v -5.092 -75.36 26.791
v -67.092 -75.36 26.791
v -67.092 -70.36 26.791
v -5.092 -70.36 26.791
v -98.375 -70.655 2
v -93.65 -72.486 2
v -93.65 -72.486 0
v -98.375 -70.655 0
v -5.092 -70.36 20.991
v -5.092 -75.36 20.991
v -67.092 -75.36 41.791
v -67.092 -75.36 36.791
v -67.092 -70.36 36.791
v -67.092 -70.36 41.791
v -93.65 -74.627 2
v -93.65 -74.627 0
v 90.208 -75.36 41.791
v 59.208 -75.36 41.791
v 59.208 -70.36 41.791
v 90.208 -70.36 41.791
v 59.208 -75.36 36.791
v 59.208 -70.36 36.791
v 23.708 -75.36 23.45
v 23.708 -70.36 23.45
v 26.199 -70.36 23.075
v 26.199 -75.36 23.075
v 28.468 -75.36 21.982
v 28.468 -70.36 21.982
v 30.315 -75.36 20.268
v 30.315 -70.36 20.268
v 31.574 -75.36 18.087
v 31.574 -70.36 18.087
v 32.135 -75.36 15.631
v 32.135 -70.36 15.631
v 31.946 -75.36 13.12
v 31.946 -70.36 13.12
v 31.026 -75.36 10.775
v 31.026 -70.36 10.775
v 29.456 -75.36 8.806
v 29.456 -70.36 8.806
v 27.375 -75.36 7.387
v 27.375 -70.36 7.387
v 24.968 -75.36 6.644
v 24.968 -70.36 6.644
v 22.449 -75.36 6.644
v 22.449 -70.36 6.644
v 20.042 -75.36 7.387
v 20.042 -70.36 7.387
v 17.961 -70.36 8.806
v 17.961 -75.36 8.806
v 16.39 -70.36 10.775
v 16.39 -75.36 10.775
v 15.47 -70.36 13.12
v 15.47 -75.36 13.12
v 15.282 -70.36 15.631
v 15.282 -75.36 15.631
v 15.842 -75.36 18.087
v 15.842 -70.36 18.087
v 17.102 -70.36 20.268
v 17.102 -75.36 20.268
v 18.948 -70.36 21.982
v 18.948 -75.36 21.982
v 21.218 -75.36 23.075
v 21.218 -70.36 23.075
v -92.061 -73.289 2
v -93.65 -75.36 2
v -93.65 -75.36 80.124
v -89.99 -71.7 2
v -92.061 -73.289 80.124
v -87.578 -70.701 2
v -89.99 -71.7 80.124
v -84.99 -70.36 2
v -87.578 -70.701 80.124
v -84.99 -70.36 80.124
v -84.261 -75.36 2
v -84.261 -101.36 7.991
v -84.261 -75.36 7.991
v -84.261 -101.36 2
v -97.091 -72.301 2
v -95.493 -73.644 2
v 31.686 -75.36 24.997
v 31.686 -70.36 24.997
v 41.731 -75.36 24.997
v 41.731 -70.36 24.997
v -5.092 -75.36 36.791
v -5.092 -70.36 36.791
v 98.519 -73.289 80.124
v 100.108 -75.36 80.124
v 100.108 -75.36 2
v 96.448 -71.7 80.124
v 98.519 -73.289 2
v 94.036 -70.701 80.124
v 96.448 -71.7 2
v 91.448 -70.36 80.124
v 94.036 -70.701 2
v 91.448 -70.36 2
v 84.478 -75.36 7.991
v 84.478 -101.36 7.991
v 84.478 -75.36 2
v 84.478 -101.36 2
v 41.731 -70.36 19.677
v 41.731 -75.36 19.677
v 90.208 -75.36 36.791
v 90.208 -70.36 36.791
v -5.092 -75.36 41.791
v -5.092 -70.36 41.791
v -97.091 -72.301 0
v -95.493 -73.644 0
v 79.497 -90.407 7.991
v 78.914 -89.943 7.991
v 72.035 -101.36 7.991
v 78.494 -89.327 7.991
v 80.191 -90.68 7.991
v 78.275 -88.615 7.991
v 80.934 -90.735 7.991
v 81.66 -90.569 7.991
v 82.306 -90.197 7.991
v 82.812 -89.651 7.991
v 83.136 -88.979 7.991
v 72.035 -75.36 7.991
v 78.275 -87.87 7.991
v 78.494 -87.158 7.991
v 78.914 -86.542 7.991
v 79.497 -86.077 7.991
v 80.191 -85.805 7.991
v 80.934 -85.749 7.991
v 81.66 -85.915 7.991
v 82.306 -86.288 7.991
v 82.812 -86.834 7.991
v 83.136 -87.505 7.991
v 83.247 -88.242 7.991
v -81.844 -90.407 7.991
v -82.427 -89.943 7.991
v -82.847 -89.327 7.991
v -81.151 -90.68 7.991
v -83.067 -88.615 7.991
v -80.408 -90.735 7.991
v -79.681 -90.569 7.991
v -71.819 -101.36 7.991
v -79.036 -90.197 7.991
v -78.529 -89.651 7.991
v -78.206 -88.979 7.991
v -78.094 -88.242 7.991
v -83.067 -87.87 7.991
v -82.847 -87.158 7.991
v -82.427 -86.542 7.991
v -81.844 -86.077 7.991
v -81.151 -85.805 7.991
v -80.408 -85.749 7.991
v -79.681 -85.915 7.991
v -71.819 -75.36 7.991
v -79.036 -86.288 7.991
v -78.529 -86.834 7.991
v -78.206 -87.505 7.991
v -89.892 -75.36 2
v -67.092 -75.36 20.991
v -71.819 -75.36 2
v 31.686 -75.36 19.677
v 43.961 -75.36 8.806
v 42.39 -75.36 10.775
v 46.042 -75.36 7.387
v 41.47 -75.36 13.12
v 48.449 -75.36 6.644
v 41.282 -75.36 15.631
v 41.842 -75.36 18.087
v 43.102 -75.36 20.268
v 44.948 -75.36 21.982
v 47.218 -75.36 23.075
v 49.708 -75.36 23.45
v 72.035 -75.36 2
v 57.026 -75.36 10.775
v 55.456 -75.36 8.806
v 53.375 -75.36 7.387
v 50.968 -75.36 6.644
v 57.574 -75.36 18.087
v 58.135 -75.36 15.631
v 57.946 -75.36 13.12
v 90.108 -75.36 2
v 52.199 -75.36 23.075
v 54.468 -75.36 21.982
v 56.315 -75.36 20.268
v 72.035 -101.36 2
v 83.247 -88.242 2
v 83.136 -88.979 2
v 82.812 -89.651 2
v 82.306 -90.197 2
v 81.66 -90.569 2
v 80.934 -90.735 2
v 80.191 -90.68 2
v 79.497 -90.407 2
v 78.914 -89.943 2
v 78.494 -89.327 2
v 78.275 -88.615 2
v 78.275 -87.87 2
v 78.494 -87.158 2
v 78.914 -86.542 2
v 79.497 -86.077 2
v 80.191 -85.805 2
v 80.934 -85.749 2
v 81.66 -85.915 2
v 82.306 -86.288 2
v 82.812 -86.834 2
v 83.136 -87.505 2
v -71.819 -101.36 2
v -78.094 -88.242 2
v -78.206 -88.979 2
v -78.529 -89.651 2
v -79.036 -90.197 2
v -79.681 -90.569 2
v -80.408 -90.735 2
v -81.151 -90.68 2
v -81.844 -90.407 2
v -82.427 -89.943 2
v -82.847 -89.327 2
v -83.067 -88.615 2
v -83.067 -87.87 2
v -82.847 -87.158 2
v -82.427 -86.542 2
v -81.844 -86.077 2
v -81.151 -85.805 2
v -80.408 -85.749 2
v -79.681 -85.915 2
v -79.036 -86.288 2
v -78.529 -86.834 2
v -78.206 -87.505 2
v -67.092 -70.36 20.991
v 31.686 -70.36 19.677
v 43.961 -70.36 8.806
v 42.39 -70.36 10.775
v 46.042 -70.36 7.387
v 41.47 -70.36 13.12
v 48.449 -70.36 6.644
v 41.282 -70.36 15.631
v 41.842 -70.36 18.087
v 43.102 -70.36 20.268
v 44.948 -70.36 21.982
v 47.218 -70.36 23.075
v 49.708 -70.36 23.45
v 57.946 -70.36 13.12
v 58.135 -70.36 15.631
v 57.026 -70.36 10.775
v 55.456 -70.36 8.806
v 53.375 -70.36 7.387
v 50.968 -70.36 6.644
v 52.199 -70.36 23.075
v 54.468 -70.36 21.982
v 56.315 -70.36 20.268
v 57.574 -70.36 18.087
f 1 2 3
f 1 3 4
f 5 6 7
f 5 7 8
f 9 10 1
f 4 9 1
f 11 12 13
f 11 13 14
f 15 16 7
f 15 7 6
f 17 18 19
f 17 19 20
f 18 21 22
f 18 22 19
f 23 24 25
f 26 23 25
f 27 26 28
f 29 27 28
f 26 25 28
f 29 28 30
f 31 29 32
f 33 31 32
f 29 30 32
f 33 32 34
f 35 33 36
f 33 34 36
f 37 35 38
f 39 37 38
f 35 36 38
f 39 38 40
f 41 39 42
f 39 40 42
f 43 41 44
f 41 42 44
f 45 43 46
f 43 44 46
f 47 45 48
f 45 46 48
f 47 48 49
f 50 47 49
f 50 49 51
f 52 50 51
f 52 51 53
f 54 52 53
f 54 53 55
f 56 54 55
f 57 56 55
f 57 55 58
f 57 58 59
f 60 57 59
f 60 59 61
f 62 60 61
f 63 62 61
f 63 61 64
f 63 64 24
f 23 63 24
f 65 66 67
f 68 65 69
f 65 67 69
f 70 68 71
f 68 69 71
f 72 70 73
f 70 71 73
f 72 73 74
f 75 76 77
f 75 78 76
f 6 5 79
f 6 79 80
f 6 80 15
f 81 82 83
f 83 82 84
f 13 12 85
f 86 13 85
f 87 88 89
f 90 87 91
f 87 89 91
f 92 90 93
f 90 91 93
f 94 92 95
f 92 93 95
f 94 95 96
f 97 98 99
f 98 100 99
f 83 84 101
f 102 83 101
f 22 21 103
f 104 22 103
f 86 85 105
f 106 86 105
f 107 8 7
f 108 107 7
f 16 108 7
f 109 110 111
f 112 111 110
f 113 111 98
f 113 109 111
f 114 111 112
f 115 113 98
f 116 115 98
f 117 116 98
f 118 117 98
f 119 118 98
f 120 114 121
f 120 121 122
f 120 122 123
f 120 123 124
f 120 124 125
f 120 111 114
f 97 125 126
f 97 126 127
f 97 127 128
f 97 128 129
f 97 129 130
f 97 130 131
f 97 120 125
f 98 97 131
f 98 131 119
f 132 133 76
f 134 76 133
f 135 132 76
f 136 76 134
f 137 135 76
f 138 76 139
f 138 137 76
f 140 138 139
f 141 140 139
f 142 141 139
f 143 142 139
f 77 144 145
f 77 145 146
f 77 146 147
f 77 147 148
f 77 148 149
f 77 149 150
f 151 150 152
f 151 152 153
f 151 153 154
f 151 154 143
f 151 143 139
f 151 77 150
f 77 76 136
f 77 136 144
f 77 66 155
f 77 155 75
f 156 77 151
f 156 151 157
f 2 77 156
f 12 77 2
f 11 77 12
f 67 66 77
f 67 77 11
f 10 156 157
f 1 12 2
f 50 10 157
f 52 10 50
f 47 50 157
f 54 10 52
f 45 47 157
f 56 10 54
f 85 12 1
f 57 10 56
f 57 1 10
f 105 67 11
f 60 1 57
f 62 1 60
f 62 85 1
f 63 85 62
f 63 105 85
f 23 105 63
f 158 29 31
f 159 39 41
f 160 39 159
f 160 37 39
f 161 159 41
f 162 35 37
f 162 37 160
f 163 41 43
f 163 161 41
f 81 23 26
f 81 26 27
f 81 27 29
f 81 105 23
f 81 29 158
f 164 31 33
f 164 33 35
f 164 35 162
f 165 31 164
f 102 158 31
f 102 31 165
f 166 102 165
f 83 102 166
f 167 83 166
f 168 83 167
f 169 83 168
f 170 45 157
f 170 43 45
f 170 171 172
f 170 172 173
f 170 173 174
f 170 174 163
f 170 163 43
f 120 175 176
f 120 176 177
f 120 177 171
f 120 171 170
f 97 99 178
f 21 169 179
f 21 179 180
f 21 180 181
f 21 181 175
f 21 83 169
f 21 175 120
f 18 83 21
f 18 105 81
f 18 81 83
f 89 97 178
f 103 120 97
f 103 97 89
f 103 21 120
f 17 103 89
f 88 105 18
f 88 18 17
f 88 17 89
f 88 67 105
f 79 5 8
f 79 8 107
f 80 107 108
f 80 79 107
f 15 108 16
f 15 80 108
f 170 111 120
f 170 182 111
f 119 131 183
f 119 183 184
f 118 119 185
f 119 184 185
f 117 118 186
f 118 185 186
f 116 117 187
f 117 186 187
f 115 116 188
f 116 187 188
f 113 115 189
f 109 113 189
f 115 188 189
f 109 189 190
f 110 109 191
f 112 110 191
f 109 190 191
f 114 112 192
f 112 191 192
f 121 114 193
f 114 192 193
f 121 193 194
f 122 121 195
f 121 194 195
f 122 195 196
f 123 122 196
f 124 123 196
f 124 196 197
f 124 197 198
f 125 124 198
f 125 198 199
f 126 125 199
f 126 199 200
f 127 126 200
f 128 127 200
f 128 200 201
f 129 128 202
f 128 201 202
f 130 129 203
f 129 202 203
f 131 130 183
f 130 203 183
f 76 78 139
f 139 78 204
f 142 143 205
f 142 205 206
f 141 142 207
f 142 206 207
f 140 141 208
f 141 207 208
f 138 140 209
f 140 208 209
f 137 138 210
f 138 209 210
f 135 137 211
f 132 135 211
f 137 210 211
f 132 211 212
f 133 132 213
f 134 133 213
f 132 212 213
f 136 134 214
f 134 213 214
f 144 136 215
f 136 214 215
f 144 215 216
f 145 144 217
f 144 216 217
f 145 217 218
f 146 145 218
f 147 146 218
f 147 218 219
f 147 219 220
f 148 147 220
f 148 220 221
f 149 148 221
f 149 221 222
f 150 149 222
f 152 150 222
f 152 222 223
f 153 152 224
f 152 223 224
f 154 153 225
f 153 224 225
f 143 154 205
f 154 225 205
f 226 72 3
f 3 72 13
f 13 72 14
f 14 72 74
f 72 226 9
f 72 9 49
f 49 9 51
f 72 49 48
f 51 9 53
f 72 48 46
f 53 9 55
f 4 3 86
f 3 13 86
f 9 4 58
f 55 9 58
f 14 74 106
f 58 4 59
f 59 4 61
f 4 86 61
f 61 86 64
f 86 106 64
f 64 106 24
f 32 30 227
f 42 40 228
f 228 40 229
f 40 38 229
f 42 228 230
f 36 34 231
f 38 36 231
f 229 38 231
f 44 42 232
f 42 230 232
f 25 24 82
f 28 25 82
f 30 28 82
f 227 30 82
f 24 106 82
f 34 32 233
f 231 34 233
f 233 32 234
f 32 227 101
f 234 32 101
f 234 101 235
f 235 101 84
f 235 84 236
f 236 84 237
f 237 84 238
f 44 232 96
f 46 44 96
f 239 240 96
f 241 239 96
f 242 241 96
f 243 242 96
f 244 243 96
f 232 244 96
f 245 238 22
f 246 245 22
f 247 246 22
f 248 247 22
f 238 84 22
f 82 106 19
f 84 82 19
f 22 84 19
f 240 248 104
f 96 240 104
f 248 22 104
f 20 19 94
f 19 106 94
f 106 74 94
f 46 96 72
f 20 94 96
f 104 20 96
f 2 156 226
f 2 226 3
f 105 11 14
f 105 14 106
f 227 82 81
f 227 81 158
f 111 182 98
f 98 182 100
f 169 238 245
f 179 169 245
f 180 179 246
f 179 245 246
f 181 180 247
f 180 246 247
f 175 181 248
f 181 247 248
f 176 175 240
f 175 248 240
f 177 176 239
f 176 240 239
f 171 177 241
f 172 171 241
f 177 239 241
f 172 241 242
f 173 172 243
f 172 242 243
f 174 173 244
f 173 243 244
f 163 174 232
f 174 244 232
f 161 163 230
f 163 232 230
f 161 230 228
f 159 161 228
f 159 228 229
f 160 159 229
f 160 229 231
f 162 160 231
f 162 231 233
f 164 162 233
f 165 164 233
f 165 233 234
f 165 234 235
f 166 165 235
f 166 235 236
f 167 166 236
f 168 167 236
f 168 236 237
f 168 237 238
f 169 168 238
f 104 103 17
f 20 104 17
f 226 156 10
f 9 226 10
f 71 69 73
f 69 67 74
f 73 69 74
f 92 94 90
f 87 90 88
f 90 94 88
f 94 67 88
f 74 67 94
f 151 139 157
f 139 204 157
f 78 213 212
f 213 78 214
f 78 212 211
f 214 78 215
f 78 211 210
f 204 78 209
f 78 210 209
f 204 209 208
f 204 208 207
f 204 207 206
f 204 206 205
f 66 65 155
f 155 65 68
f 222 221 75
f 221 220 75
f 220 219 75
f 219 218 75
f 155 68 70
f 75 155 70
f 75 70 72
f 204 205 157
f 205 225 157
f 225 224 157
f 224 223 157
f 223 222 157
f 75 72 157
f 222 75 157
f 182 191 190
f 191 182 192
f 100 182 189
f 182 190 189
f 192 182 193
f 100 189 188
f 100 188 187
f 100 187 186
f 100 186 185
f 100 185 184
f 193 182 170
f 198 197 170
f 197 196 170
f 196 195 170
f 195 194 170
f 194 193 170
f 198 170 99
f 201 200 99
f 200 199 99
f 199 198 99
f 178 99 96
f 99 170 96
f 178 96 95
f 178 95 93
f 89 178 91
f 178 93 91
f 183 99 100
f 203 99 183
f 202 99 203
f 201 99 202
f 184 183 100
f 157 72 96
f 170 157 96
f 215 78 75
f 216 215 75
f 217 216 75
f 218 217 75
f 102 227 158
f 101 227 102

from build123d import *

# Parameters (mm, degrees)
CROQUIS2_W              = 200
CROQUIS2_H              = 150
CROQUIS2_R              = 2
CROQUIS2_R_2            = 2.5
CROQUIS2_W_2            = 31.297292299
CROQUIS2_H_2            = 43.768728426
CROQUIS2_H_3            = 43.768728427
CROQUIS2_W_3            = 23.573907934
CROQUIS2_H_4            = 45.323962431
SALIENTE_EXTRUIR1_DEPTH = 2
REDONDEO1_R             = 10
BOSS_EXTRUDE1_DEPTH     = 25
SKETCH3_W               = 62.040442094
SKETCH3_H               = 5.530821024
BOSS_EXTRUDE2_DEPTH     = 22
SKETCH8_W               = 62.040442094
SKETCH8_H               = 5.530821024
BOSS_EXTRUDE6_DEPTH     = 13
SKETCH2_W               = 193.758392872
SKETCH2_H               = 78.124132015
SKETCH2_W_2             = 62.040442094
SKETCH2_H_2             = 5.530821024
BOSS_EXTRUDE3_DEPTH     = 5
SKETCH4_W               = 62.040442094
SKETCH4_H               = 5.530821024
BOSS_EXTRUDE4_DEPTH     = 19
SKETCH5_W               = 7.442573222
SKETCH5_H               = 2.991451355
BOSS_EXTRUDE5_DEPTH     = 21
SKETCH6_R               = 2.5
CUT_EXTRUDE1_DEPTH      = 158.961544101
FILLET1_R               = 10
SKETCH13_W              = 62.040442094
SKETCH13_H              = 4.214652984
CUT_EXTRUDE6_DEPTH      = 149.758539633
SKETCH14_R              = 2.5
CUT_EXTRUDE7_DEPTH      = 158.961544101
SKETCH11_W              = 62
SKETCH11_H              = 5.8
SKETCH11_H_2            = 5
SKETCH11_W_2            = 193.758392872
SKETCH11_H_3            = 2
SKETCH11_W_3            = 27.3
CUT_EXTRUDE8_DEPTH      = 205.260962853
SKETCH17_W              = 130.161323944
SKETCH17_H              = 157.545365022
CUT_EXTRUDE9_DEPTH      = 149.758539633
CROQUIS5_W              = 3.7
CROQUIS5_H              = 5
CORTAR_EXTRUIR7_DEPTH   = 10
CROQUIS6_W              = 2.991451355
CROQUIS6_H              = 21
SALIENTE_EXTRUIR2_DEPTH = 5
CROQUIS7_W              = 12.442573222
CROQUIS7_H              = 2.991451355
SALIENTE_EXTRUIR3_DEPTH = 5
CROQUIS8_W              = 12.442573222
CROQUIS8_H              = 26
SALIENTE_EXTRUIR4_DEPTH = 3
CROQUIS9_R              = 2.5
CORTAR_EXTRUIR8_DEPTH   = 16
CROQUIS11_W             = 2.991451355
CROQUIS11_H             = 21
SALIENTE_EXTRUIR5_DEPTH = 5
CROQUIS12_W             = 12.442573222
CROQUIS12_H             = 2.991451355
SALIENTE_EXTRUIR6_DEPTH = 5
CROQUIS13_W             = 12.442573222
CROQUIS13_H             = 26
SALIENTE_EXTRUIR7_DEPTH = 3
CROQUIS14_R             = 2.5
CORTAR_EXTRUIR9_DEPTH   = 15
CROQUIS15_W             = 10.045182272
CROQUIS15_H             = 5.32
CROQUIS15_R             = 8.45
CORTAR_EXTRUIR10_DEPTH  = 15


with BuildPart() as part:
    # Croquis2 → Saliente-Extruir1 (new body)
    with BuildSketch(Plane.XY):
        with Locations((0.108263467, -0.36008145)):
            Rectangle(CROQUIS2_W, CROQUIS2_H)
        with Locations((89.108263467, -66.5)):
            Circle(CROQUIS2_R, mode=Mode.SUBTRACT)
        with Locations((-88.891736533, -66.5)):
            Circle(CROQUIS2_R, mode=Mode.SUBTRACT)
        with Locations(Location((89.108263467, 65.779837101, 0), (0, 0, 180))):
            Circle(CROQUIS2_R, mode=Mode.SUBTRACT)
        with Locations(Location((-88.891736533, 65.779837101, 0), (0, 0, 180))):
            Circle(CROQUIS2_R, mode=Mode.SUBTRACT)
        with Locations((-80.865436179, -59.36008145)):
            Circle(CROQUIS2_R_2, mode=Mode.SUBTRACT)
        with Locations((81.108263467, -59.36008145)):
            Circle(CROQUIS2_R_2, mode=Mode.SUBTRACT)
        with Locations(Location((81.108263467, 58.63991855, 0), (0, 0, 180))):
            Circle(CROQUIS2_R_2, mode=Mode.SUBTRACT)
        with Locations(Location((-80.865436179, 58.63991855, 0), (0, 0, 180))):
            Circle(CROQUIS2_R_2, mode=Mode.SUBTRACT)
        with BuildLine():
            Line((-62.091736533, 70.63991855), (64.108263467, 70.63991855))
            ThreePointArc((64.108263467, 70.63991855), (66.108263467, 68.63991855), (64.108263467, 66.63991855))
            Line((64.108263467, 66.63991855), (-62.091736533, 66.63991855))
            ThreePointArc((-62.091736533, 66.63991855), (-64.091736533, 68.63991855), (-62.091736533, 70.63991855))
        make_face(mode=Mode.SUBTRACT)
        Polygon((-71.391736533, -12.902447307), (-71.391736533, 12.182284408), (-79.241736533, 12.28991855), (-83.891736533, 12.28991855), (-83.891736533, -13.01008145), (-79.241736533, -13.01008145), align=None, mode=Mode.SUBTRACT)
        with BuildLine():
            Line((92.108263467, 45.478381757), (92.108263467, -46.198544657))
            ThreePointArc((92.108263467, -46.198544657), (90.807295546, -47.897576736), (89.108263467, -46.596608814))
            Line((89.108263467, -46.596608814), (89.108263467, 45.876445915))
            ThreePointArc((89.108263467, 45.876445915), (90.807295546, 47.177413836), (92.108263467, 45.478381757))
        make_face(mode=Mode.SUBTRACT)
        Polygon((84.108263467, 12.28991855), (84.108263467, -13.01008145), (79.458263467, -13.01008145), (71.608263467, -13.01008145), (71.608263467, 12.28991855), (79.458263467, 12.28991855), align=None, mode=Mode.SUBTRACT)
        with BuildLine():
            Line((-91.891736533, 45.478381757), (-91.891736533, -46.198544657))
            ThreePointArc((-91.891736533, -46.198544657), (-90.590768612, -47.897576736), (-88.891736533, -46.596608814))
            Line((-88.891736533, -46.596608814), (-88.891736533, 45.876445915))
            ThreePointArc((-88.891736533, 45.876445915), (-90.590768612, 47.177413836), (-91.891736533, 45.478381757))
        make_face(mode=Mode.SUBTRACT)
        with Locations((-30.011405388, 36.299005811)):
            Rectangle(CROQUIS2_W_2, CROQUIS2_H_2, mode=Mode.SUBTRACT)
        with BuildLine():
            Line((-62.091736533, -71.36008145), (64.108263467, -71.36008145))
            ThreePointArc((64.108263467, -71.36008145), (66.108263467, -69.36008145), (64.108263467, -67.36008145))
            Line((64.108263467, -67.36008145), (-62.091736533, -67.36008145))
            ThreePointArc((-62.091736533, -67.36008145), (-64.091736533, -69.36008145), (-62.091736533, -71.36008145))
        make_face(mode=Mode.SUBTRACT)
        with Locations((-30.011405388, -26.799059535)):
            Rectangle(CROQUIS2_W_2, CROQUIS2_H_3, mode=Mode.SUBTRACT)
        with Locations((12.982877294, -0.693345879)):
            Rectangle(CROQUIS2_W_3, CROQUIS2_H_4, mode=Mode.SUBTRACT)
    extrude(amount=SALIENTE_EXTRUIR1_DEPTH)

    # Redondeo1
    redondeo1_edges = [part.edges().sort_by_distance(p)[0] for p in [
        (100.108263467, -75.36008145, 1),
        (-99.891736533, -75.36008145, 1),
        (-99.891736533, 74.63991855, 1),
        (100.108263467, 74.63991855, 1),
    ]]
    fillet(redondeo1_edges, radius=REDONDEO1_R)

    # Sketch1 → Boss-Extrude1 (add)
    with BuildSketch(Plane.XY.offset(2)):
        Polygon((-67.071845217, 64.63991855), (-67.071845217, 60.63991855), (-8.841198185, 60.63991855), (-8.841198185, 3.63991855), (-67.071845217, 3.63991855), (-67.071845217, -0.36008145), (-8.841198185, -0.36008145), (-8.841198185, -53.36008145), (-67.071845217, -53.36008145), (-67.071845217, -57.574734434), (-5.031403123, -57.574734434), (-5.031403123, -40.931443482), (46.608263467, -40.931443482), (46.608263467, -36.931443482), (-5.031403123, -36.931443482), (-5.031403123, 30.068556518), (46.608263467, 30.068556518), (46.608263467, 34.068556518), (-5.031403123, 34.068556518), (-5.031403123, 64.63991855), align=None)
    extrude(amount=BOSS_EXTRUDE1_DEPTH)

    # Sketch3 → Boss-Extrude2 (add)
    with BuildSketch(Plane.XZ.offset(57.574734434)):
        with Locations((-36.05162417, 24.234589488)):
            Rectangle(SKETCH3_W, SKETCH3_H)
    extrude(amount=BOSS_EXTRUDE2_DEPTH)

    # Sketch8 → Boss-Extrude6 (add)
    with BuildSketch(Plane(origin=(0, 64.63991855, 0), x_dir=(1, 0, 0), z_dir=(0, 1, 0))):
        with Locations((-36.05162417, -24.234589488)):
            Rectangle(SKETCH8_W, SKETCH8_H)
    extrude(amount=BOSS_EXTRUDE6_DEPTH)

    # Sketch2 → Boss-Extrude3 (add)
    with BuildSketch(Plane.XZ.offset(75.36008145)):
        with Locations((3.229067031, 41.062066008)):
            Rectangle(SKETCH2_W, SKETCH2_H)
        with Locations((-36.05162417, 24.234589488)):
            Rectangle(SKETCH2_W_2, SKETCH2_H_2, mode=Mode.SUBTRACT)
    extrude(amount=-BOSS_EXTRUDE3_DEPTH)

    # Sketch4 → Boss-Extrude4 (add)
    with BuildSketch(Plane(origin=(0, 64.63991855, 0), x_dir=(1, 0, 0), z_dir=(0, 1, 0))):
        with Locations((-36.05162417, -24.234589488)):
            Rectangle(SKETCH4_W, SKETCH4_H)
    extrude(amount=BOSS_EXTRUDE4_DEPTH)

    # Sketch5 → Boss-Extrude5 (add)
    with BuildSketch(Plane.XZ.offset(75.36008145)):
        with Locations((-80.540187187, 3.495725678)):
            Rectangle(SKETCH5_W, SKETCH5_H)
        with Locations((80.756714122, 3.495725678)):
            Rectangle(SKETCH5_W, SKETCH5_H)
    extrude(amount=BOSS_EXTRUDE5_DEPTH)

    # Sketch6 → Cut-Extrude1 (cut, through all)
    with BuildSketch(Plane.XY.offset(4.991451355)):
        with Locations((-80.996023003, -59.284349751)):
            Circle(SKETCH6_R)
        with Locations(Location((85.770332707, -52.138660273, 0), (0, 0, 180))):
            Circle(SKETCH6_R)
        Polygon((-106.504987954, 85.891433433), (-93.566486568, 85.891433433), (-93.566486568, -70.36008145), (-93.650129405, -70.36008145), (-93.650129405, -72.48561093), (-99.134958643, -70.36008145), (-106.504987954, -70.36008145), align=None)
    extrude(amount=-CUT_EXTRUDE1_DEPTH, mode=Mode.SUBTRACT)

    # Fillet1
    # the kernel refuses this fillet: 10 mm, written as the material it takes off along each edge
    with BuildSketch(Plane(origin=(-93.650129405, -70.36008145, 101.77476711), x_dir=(1, 0, 0), z_dir=(0, 0, -1))) as fillet1_piece_1_section:
        with BuildLine():
            CenterArc((8.660254038, 10), FILLET1_R, 210, 60)
            Line((0, 5), (0, 0))
            Line((0, 0), (8.660254038, 0))
        make_face()
    fillet1_piece_1 = extrude(amount=123.425402204, mode=Mode.PRIVATE)
    fillet1_piece_1 = split(fillet1_piece_1, bisect_by=Plane(origin=(-88.735327831, -71.066428463, 2), z_dir=(0, 0, 1)), keep=Keep.TOP, mode=Mode.PRIVATE)
    add(fillet1_piece_1, mode=Mode.SUBTRACT)
    with BuildSketch(Plane(origin=(-93.650129405, -70.36008145, 101.77476711), x_dir=(1, 0, 0), z_dir=(0, 0, -1))) as fillet1_piece_2_section:
        with BuildLine():
            CenterArc((8.660254038, 10), FILLET1_R, 210, 60)
            Line((0, 5), (0, 0))
            Line((0, 0), (8.660254038, 0))
        make_face()
    fillet1_piece_2 = extrude(amount=123.425402204, mode=Mode.PRIVATE)
    fillet1_piece_2 = split(fillet1_piece_2, bisect_by=Plane(origin=(-93.566486568, -71.430970133, 1), z_dir=(-1, 0, 0)), keep=Keep.TOP, mode=Mode.PRIVATE)
    fillet1_piece_2 = split(fillet1_piece_2, bisect_by=Plane(origin=(-93.969016237, -72.362033087, 1), z_dir=(0.36134444351220746, 0.9324324067420936, 0)), keep=Keep.TOP, mode=Mode.PRIVATE)
    add(fillet1_piece_2, mode=Mode.SUBTRACT)
    with BuildSketch(Plane(origin=(100.108263467, -70.36008145, 2), x_dir=(-1, 0, 0), z_dir=(0, 0, 1))) as fillet1_piece_3:
        with BuildLine():
            CenterArc((8.660254038, 10), FILLET1_R, 210, 60)
            Line((0, 5), (0, 0))
            Line((0, 0), (8.660254038, 0))
        make_face()
    extrude(amount=99.77476711, mode=Mode.SUBTRACT)

    # Sketch13 → Cut-Extrude6 (cut, through all)
    with BuildSketch(Plane.XY.offset(27)):
        with Locations((-36.05162417, -77.467407942)):
            Rectangle(SKETCH13_W, SKETCH13_H)
    extrude(amount=-CUT_EXTRUDE6_DEPTH, mode=Mode.SUBTRACT)

    # Sketch14 → Cut-Extrude7 (cut, through all)
    with BuildSketch(Plane.XY.offset(4.991451355)):
        with Locations((-80.594436734, -88.242300615)):
            Circle(SKETCH14_R)
        with Locations((80.746860659, -88.242300615)):
            Circle(SKETCH14_R)
    extrude(amount=-CUT_EXTRUDE7_DEPTH, mode=Mode.SUBTRACT)

    # Sketch11 → Cut-Extrude8 (cut, through all)
    with BuildSketch(Plane.XZ.offset(75.36008145)):
        with Locations((-36.091736533, 23.891451355)):
            Rectangle(SKETCH11_W, SKETCH11_H)
        with Locations((-36.091736533, 39.291451355)):
            Rectangle(SKETCH11_W, SKETCH11_H_2)
        with Locations((3.229067031, 1)):
            Rectangle(SKETCH11_W_2, SKETCH11_H_3)
        with Locations((72.858263467, 39.291451355)):
            Rectangle(SKETCH11_W_3, SKETCH11_H_2)
    extrude(amount=-CUT_EXTRUDE8_DEPTH, mode=Mode.SUBTRACT)


with BuildPart() as cut_extrude8_piece_1:
    # of the separate pieces the step leaves, piece 1, a body of its own (cut_extrude8_pieces)
    add(part.part.solids().sort_by_distance((-84.261473798, -75.36008145, 4.991451355))[0])

    # Sketch17 → Cut-Extrude9 (cut, through all)
    with BuildSketch(Plane.XY.offset(27)):
        with Locations((-14.253473071, 8.412601061)):
            Rectangle(SKETCH17_W, SKETCH17_H)
    extrude(amount=-CUT_EXTRUDE9_DEPTH, mode=Mode.SUBTRACT)

    # Croquis5 → Cortar-Extruir7 (cut)
    with BuildSketch(Plane.XZ.offset(75.36008145)):
        with Locations((88.358263467, 39.291451355)):
            Rectangle(CROQUIS5_W, CROQUIS5_H)
    extrude(amount=-CORTAR_EXTRUIR7_DEPTH, mode=Mode.SUBTRACT)

    # Croquis6 → Saliente-Extruir2 (add)
    with BuildSketch(Plane(origin=(-76.818900576, 0, 0), x_dir=(0, 0, -1), z_dir=(1, 0, 0))):
        with Locations((-3.495725678, -85.86008145)):
            Rectangle(CROQUIS6_W, CROQUIS6_H)
    extrude(amount=SALIENTE_EXTRUIR2_DEPTH)

    # Croquis7 → Saliente-Extruir3 (add)
    with BuildSketch(Plane.XZ.offset(96.36008145)):
        with Locations((-78.040187187, 3.495725678)):
            Rectangle(CROQUIS7_W, CROQUIS7_H)
    extrude(amount=SALIENTE_EXTRUIR3_DEPTH)

    # Croquis8 → Saliente-Extruir4 (add)
    with BuildSketch(Plane.XY.offset(4.991451355)):
        with Locations((-78.040187187, -88.36008145)):
            Rectangle(CROQUIS8_W, CROQUIS8_H)
    extrude(amount=SALIENTE_EXTRUIR4_DEPTH)

    # Croquis9 → Cortar-Extruir8 (cut)
    with BuildSketch(Plane(origin=(0, 0, 2), x_dir=(-1, 0, 0), z_dir=(0, 0, -1))):
        with Locations(Location((80.594436734, -88.242300615, 0), (0, 0, 180))):
            Circle(CROQUIS9_R)
    extrude(amount=-CORTAR_EXTRUIR8_DEPTH, mode=Mode.SUBTRACT)

    # Croquis11 → Saliente-Extruir5 (add)
    with BuildSketch(Plane.ZY.offset(-77.035427511)):
        with Locations((3.495725678, -85.86008145)):
            Rectangle(CROQUIS11_W, CROQUIS11_H)
    extrude(amount=SALIENTE_EXTRUIR5_DEPTH)

    # Croquis12 → Saliente-Extruir6 (add)
    with BuildSketch(Plane.XZ.offset(96.36008145)):
        with Locations((78.256714122, 3.495725678)):
            Rectangle(CROQUIS12_W, CROQUIS12_H)
    extrude(amount=SALIENTE_EXTRUIR6_DEPTH)

    # Croquis13 → Saliente-Extruir7 (add)
    with BuildSketch(Plane.XY.offset(4.991451355)):
        with Locations((78.256714122, -88.36008145)):
            Rectangle(CROQUIS13_W, CROQUIS13_H)
    extrude(amount=SALIENTE_EXTRUIR7_DEPTH)

    # Croquis14 → Cortar-Extruir9 (cut)
    with BuildSketch(Plane(origin=(0, 0, 2), x_dir=(-1, 0, 0), z_dir=(0, 0, -1))):
        with Locations(Location((-80.746860659, -88.242300615, 0), (0, 0, 180))):
            Circle(CROQUIS14_R)
    extrude(amount=-CORTAR_EXTRUIR9_DEPTH, mode=Mode.SUBTRACT)

    # Croquis15 → Cortar-Extruir10 (cut)
    with BuildSketch(Plane(origin=(0, -70.36008145, 0), x_dir=(1, 0, 0), z_dir=(0, 1, 0))):
        with Locations((36.708263467, -22.337318572)):
            Rectangle(CROQUIS15_W, CROQUIS15_H)
        with Locations(Location((49.708263467, -15, 0), (0, 0, 270))):
            Circle(CROQUIS15_R)
        with Locations(Location((23.708263467, -15, 0), (0, 0, 270))):
            Circle(CROQUIS15_R)
    extrude(amount=-CORTAR_EXTRUIR10_DEPTH, mode=Mode.SUBTRACT)


with BuildPart() as cut_extrude8_piece_2:
    # of the separate pieces the step leaves, piece 2, a body of its own (cut_extrude8_pieces)
    add(part.part.solids().sort_by_distance((-93.650129405, -74.626930052, 0))[0])


solid = Compound([cut_extrude8_piece_1.part, cut_extrude8_piece_2.part])
